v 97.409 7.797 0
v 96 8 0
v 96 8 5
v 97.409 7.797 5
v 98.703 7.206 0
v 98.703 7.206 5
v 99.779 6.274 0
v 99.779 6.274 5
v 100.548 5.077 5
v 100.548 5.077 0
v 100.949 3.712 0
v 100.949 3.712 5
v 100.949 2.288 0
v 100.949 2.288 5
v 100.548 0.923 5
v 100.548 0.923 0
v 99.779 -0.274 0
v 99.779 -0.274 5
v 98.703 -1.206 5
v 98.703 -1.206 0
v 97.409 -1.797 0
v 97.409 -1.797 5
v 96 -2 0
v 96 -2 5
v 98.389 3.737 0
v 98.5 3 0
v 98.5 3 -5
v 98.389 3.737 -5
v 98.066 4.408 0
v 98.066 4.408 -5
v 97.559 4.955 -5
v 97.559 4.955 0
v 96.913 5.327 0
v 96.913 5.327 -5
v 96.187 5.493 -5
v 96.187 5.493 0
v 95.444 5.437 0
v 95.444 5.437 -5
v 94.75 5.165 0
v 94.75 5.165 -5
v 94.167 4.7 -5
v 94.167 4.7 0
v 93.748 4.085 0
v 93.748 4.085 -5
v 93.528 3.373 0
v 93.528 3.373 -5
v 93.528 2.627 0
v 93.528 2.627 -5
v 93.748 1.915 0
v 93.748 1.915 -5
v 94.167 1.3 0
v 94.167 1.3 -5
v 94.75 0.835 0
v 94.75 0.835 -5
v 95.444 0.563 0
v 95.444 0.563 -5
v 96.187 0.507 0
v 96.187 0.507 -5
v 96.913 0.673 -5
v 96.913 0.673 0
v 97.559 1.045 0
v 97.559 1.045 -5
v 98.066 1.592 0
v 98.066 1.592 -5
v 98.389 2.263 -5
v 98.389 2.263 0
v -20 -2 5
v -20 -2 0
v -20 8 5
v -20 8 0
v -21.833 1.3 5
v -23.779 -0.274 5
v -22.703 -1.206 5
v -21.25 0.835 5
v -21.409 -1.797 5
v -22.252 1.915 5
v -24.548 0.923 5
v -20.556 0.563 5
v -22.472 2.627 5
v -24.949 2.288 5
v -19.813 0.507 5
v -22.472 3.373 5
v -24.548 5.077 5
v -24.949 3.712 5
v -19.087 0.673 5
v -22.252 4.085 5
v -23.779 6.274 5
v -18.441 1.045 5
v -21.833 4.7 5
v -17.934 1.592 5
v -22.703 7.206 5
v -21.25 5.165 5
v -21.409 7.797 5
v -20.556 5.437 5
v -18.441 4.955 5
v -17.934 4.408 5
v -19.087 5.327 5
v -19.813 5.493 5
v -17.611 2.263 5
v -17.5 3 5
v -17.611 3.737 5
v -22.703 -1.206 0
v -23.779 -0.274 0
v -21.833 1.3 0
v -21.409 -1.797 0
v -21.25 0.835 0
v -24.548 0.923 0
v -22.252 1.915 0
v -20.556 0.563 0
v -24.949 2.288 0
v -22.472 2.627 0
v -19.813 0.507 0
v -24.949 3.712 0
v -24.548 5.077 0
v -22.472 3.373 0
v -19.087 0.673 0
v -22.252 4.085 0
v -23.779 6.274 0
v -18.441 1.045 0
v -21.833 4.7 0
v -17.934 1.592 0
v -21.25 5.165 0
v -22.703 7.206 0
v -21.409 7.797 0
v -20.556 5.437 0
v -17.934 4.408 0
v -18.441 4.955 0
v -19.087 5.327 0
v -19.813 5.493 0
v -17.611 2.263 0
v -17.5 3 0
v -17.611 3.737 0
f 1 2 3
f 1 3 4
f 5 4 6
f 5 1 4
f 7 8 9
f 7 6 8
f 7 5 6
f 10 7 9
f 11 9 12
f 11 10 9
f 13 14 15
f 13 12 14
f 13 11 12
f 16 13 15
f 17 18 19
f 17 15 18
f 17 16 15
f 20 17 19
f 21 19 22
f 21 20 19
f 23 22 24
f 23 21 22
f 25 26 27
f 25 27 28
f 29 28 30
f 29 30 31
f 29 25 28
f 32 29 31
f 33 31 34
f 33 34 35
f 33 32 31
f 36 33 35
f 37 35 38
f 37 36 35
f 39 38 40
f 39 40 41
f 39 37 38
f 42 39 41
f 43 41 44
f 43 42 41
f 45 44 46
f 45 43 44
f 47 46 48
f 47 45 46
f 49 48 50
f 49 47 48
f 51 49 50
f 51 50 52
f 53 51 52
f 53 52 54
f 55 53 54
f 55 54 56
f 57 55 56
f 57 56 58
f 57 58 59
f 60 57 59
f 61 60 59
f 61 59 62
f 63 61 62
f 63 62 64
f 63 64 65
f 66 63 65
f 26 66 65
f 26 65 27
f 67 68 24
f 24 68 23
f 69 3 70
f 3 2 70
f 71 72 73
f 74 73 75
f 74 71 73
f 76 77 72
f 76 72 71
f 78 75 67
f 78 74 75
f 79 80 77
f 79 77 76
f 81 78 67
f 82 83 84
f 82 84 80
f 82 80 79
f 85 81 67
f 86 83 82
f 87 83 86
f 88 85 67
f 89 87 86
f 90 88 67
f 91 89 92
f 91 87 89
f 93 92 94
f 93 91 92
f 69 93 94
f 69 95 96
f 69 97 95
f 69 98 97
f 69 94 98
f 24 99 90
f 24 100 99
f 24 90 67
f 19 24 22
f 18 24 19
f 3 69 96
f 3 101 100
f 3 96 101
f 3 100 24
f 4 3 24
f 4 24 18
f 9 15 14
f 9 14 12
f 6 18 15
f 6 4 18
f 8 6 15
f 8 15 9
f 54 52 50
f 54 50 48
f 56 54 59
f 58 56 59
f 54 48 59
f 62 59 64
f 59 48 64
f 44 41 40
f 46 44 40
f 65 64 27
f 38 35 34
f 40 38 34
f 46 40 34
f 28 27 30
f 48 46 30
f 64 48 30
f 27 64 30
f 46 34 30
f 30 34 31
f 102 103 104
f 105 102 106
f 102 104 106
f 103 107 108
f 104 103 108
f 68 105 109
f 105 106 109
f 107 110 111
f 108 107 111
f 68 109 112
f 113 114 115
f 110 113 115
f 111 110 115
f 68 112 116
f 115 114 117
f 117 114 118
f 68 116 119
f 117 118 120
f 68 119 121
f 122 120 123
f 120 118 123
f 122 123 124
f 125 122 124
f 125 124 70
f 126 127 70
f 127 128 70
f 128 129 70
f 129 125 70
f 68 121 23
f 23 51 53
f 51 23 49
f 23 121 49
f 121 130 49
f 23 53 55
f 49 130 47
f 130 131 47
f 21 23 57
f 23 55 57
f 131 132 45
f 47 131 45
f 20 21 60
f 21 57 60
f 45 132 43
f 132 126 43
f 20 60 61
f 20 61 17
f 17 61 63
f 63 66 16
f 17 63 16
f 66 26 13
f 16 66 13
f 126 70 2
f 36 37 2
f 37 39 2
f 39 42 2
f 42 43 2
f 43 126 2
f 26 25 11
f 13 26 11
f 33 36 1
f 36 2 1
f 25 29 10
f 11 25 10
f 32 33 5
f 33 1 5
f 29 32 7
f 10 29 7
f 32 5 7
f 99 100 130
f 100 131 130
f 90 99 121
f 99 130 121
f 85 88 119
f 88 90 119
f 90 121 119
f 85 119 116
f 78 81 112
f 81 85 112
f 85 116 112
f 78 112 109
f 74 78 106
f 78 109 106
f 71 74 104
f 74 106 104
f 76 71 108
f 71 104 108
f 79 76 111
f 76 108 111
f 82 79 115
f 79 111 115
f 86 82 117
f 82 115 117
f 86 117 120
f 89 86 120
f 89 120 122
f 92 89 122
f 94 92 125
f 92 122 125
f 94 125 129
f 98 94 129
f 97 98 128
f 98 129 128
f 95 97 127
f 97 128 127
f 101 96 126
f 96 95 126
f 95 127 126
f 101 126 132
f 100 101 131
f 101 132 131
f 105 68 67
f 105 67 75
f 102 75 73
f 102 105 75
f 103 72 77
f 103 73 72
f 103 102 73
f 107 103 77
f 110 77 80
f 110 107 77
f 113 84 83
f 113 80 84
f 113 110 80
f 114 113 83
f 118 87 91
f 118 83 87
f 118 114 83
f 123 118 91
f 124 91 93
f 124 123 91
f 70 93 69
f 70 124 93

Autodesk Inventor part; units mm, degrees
ref_plane "YZ Plane" through (0, 0, 0) normal (1, 0, 0) x (0, 1, 0)
ref_plane "XZ Plane" through (0, 0, 0) normal (0, 1, 0) x (-1, 0, 0)
ref_plane "XY Plane" through (0, 0, 0) normal (0, 0, 1) x (1, 0, 0)
sketch "Sketch1" plane through (0, 0, 0) normal (0, 0, 1) x (1, 0, 0)
  line L0 (-20, 3) -> (96, 3) construction
  line L1 (-20, -2) -> (96, -2)
  line L2 (96, 8) -> (-20, 8)
  arc A0 (-20, 8) -> (-20, -2) centre (-20, 3) ccw
  arc A1 (96, -2) -> (96, 8) centre (96, 3) ccw
  circle A2 centre (-20, 3) radius 2.5
  circle A3 centre (96, 3) radius 2.5
  point P0 (0, 0)
  point P1 (38, 3)
  dimension "d0" = 10
  dimension "d1" = 5
  dimension "d2" = 116
extrude "Extrusion1" add sketch "Sketch1" along normal blind 5 contours A0 L2 A1 L1 | A3
extrude "Extrusion2" add sketch "Sketch1" against normal blind 5 contours A3
properties material "Copper, Alloy"
